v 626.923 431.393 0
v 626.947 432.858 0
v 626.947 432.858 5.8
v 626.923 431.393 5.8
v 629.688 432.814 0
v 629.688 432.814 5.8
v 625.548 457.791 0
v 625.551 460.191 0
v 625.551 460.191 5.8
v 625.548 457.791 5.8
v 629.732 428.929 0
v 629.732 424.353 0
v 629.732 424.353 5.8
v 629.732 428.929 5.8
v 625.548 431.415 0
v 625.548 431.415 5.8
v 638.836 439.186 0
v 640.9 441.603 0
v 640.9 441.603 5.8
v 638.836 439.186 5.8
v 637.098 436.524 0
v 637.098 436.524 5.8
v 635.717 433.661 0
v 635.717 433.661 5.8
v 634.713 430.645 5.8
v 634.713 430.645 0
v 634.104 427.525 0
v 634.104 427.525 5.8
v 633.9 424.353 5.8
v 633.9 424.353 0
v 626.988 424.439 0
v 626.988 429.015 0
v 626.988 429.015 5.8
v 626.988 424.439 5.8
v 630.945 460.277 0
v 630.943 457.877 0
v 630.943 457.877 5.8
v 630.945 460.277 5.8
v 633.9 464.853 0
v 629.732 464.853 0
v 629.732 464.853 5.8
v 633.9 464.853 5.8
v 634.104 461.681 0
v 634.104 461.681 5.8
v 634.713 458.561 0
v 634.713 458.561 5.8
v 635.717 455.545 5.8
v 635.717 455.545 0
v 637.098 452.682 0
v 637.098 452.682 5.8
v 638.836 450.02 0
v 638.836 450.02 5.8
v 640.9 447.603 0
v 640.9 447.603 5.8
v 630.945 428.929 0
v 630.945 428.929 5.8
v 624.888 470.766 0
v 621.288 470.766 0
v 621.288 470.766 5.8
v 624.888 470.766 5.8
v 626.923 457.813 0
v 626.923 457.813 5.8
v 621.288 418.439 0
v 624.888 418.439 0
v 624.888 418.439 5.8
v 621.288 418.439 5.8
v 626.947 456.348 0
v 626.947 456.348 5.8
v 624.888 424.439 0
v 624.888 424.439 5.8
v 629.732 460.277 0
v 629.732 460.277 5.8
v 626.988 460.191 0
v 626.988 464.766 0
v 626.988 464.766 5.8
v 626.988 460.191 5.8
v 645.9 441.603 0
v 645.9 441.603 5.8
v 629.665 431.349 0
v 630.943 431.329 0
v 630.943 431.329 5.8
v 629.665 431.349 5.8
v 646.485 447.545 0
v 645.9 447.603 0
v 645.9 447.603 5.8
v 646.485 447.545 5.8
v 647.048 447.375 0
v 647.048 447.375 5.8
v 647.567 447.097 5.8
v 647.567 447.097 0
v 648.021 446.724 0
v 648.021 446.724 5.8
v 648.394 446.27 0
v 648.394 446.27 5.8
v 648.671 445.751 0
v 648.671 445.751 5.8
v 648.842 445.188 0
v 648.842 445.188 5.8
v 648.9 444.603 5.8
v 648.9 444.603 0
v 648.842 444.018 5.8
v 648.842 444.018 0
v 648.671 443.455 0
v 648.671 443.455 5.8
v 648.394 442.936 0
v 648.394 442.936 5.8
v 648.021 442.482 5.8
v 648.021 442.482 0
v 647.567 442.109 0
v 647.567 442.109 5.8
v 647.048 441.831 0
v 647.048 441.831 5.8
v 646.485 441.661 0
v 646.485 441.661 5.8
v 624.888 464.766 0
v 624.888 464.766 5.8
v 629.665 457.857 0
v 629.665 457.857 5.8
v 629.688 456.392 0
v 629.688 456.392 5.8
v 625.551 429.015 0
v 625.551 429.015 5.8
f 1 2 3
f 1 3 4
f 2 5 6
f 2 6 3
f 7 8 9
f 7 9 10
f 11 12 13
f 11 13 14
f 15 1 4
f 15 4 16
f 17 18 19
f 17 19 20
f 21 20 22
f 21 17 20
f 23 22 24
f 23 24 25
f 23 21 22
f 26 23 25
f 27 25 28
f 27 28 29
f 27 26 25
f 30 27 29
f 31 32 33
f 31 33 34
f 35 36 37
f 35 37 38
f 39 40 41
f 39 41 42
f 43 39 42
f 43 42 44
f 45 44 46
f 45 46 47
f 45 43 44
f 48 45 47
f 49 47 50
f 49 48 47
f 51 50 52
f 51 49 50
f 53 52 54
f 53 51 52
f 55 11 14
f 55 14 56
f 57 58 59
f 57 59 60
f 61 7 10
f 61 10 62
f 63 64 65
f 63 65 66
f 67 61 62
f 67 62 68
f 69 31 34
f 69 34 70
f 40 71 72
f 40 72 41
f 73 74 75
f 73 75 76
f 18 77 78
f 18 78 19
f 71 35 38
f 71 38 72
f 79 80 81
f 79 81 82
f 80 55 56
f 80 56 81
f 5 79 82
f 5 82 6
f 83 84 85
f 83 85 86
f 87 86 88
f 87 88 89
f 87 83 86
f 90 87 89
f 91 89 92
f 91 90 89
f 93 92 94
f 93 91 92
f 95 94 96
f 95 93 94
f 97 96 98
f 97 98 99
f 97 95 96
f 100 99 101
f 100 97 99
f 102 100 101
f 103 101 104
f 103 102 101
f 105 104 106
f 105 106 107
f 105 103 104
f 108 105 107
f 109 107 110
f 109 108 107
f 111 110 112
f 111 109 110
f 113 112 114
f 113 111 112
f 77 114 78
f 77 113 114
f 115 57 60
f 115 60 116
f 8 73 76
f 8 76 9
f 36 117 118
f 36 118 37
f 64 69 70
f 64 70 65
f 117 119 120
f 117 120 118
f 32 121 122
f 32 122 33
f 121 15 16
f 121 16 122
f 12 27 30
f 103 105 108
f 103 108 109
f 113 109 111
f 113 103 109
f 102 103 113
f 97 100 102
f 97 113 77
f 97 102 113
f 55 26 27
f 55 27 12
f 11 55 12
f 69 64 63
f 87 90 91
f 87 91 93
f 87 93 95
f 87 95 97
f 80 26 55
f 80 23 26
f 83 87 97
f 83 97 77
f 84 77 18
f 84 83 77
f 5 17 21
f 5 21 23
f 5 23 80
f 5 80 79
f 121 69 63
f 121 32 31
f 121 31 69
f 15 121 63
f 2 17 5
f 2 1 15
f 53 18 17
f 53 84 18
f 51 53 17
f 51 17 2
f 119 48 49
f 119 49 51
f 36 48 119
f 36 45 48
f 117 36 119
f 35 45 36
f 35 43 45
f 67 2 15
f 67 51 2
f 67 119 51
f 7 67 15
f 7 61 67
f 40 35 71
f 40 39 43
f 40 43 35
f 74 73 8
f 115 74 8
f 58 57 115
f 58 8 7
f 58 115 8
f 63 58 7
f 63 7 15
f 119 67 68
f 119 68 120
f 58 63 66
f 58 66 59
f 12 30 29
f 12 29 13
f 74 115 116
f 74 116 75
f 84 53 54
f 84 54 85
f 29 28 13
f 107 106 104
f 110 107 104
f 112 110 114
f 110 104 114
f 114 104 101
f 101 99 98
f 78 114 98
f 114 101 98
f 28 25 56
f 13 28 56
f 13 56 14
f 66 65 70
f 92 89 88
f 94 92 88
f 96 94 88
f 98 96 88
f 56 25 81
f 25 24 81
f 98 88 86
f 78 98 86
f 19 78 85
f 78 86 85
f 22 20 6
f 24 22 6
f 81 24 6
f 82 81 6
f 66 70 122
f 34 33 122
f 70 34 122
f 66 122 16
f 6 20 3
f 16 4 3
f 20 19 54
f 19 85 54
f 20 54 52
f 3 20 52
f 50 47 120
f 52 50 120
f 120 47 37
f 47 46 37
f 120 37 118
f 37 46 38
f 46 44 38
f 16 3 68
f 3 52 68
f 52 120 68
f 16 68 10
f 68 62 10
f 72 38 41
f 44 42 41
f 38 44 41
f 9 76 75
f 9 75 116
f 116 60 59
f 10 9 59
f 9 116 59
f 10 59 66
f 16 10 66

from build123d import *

# Parameters (mm, degrees)
BOSS_EXTRUDE1_DEPTH = 5.8


with BuildPart() as part:
    # Sketch1 → Boss-Extrude1 (new body)
    with BuildSketch(Plane.XY):
        with BuildLine():
            Line((640.899853243, 447.602981641), (645.899853243, 447.602981641))
            ThreePointArc((645.899853243, 447.602981641), (648.899853243, 444.602981641), (645.899853243, 441.602981641))
            Line((645.899853243, 441.602981641), (640.899853243, 441.602981641))
            ThreePointArc((640.899853243, 441.602981641), (635.71651299, 433.661076237), (633.899853243, 424.352981641))
            Line((633.899853243, 424.352981641), (629.732441047, 424.352981641))
            Line((629.732441047, 424.352981641), (629.732441047, 428.928887757))
            Line((629.732441047, 428.928887757), (630.944771309, 428.928887757))
            Line((630.944771309, 428.928887757), (630.942520898, 431.328937702))
            Line((630.942520898, 431.328937702), (629.664733055, 431.349424729))
            Line((629.664733055, 431.349424729), (629.688208222, 432.81358455))
            Line((629.688208222, 432.81358455), (626.946903544, 432.857536436))
            Line((626.946903544, 432.857536436), (626.923428377, 431.393376615))
            Line((626.923428377, 431.393376615), (625.548423101, 431.415422349))
            Line((625.548423101, 431.415422349), (625.550673512, 429.015372404))
            Line((625.550673512, 429.015372404), (626.988308144, 429.015372404))
            Line((626.988308144, 429.015372404), (626.988308144, 424.439466289))
            Line((626.988308144, 424.439466289), (624.888308144, 424.439466289))
            Line((624.888308144, 424.439466289), (624.888308144, 418.439466289))
            Line((624.888308144, 418.439466289), (621.288308144, 418.439466289))
            Line((621.288308144, 418.439466289), (621.288308144, 424.439466289))
            Line((621.288308144, 424.439466289), (621.288308144, 464.766496994))
            Line((621.288308144, 464.766496994), (621.288308144, 470.766496994))
            Line((621.288308144, 470.766496994), (624.888308144, 470.766496994))
            Line((624.888308144, 470.766496994), (624.888308144, 464.766496994))
            Line((624.888308144, 464.766496994), (626.988308144, 464.766496994))
            Line((626.988308144, 464.766496994), (626.988308144, 460.190590879))
            Line((626.988308144, 460.190590879), (625.550673512, 460.190590879))
            Line((625.550673512, 460.190590879), (625.548423101, 457.790540934))
            Line((625.548423101, 457.790540934), (626.923428377, 457.812586668))
            Line((626.923428377, 457.812586668), (626.946903544, 456.348426847))
            Line((626.946903544, 456.348426847), (629.688208222, 456.392378732))
            Line((629.688208222, 456.392378732), (629.664733055, 457.856538553))
            Line((629.664733055, 457.856538553), (630.942520898, 457.877025581))
            Line((630.942520898, 457.877025581), (630.944771309, 460.277075526))
            Line((630.944771309, 460.277075526), (629.732441047, 460.277075526))
            Line((629.732441047, 460.277075526), (629.732441047, 464.852981641))
            Line((629.732441047, 464.852981641), (633.899853243, 464.852981641))
            ThreePointArc((633.899853243, 464.852981641), (635.71651299, 455.544887046), (640.899853243, 447.602981641))
        make_face()
    extrude(amount=BOSS_EXTRUDE1_DEPTH)


solid = part.part
